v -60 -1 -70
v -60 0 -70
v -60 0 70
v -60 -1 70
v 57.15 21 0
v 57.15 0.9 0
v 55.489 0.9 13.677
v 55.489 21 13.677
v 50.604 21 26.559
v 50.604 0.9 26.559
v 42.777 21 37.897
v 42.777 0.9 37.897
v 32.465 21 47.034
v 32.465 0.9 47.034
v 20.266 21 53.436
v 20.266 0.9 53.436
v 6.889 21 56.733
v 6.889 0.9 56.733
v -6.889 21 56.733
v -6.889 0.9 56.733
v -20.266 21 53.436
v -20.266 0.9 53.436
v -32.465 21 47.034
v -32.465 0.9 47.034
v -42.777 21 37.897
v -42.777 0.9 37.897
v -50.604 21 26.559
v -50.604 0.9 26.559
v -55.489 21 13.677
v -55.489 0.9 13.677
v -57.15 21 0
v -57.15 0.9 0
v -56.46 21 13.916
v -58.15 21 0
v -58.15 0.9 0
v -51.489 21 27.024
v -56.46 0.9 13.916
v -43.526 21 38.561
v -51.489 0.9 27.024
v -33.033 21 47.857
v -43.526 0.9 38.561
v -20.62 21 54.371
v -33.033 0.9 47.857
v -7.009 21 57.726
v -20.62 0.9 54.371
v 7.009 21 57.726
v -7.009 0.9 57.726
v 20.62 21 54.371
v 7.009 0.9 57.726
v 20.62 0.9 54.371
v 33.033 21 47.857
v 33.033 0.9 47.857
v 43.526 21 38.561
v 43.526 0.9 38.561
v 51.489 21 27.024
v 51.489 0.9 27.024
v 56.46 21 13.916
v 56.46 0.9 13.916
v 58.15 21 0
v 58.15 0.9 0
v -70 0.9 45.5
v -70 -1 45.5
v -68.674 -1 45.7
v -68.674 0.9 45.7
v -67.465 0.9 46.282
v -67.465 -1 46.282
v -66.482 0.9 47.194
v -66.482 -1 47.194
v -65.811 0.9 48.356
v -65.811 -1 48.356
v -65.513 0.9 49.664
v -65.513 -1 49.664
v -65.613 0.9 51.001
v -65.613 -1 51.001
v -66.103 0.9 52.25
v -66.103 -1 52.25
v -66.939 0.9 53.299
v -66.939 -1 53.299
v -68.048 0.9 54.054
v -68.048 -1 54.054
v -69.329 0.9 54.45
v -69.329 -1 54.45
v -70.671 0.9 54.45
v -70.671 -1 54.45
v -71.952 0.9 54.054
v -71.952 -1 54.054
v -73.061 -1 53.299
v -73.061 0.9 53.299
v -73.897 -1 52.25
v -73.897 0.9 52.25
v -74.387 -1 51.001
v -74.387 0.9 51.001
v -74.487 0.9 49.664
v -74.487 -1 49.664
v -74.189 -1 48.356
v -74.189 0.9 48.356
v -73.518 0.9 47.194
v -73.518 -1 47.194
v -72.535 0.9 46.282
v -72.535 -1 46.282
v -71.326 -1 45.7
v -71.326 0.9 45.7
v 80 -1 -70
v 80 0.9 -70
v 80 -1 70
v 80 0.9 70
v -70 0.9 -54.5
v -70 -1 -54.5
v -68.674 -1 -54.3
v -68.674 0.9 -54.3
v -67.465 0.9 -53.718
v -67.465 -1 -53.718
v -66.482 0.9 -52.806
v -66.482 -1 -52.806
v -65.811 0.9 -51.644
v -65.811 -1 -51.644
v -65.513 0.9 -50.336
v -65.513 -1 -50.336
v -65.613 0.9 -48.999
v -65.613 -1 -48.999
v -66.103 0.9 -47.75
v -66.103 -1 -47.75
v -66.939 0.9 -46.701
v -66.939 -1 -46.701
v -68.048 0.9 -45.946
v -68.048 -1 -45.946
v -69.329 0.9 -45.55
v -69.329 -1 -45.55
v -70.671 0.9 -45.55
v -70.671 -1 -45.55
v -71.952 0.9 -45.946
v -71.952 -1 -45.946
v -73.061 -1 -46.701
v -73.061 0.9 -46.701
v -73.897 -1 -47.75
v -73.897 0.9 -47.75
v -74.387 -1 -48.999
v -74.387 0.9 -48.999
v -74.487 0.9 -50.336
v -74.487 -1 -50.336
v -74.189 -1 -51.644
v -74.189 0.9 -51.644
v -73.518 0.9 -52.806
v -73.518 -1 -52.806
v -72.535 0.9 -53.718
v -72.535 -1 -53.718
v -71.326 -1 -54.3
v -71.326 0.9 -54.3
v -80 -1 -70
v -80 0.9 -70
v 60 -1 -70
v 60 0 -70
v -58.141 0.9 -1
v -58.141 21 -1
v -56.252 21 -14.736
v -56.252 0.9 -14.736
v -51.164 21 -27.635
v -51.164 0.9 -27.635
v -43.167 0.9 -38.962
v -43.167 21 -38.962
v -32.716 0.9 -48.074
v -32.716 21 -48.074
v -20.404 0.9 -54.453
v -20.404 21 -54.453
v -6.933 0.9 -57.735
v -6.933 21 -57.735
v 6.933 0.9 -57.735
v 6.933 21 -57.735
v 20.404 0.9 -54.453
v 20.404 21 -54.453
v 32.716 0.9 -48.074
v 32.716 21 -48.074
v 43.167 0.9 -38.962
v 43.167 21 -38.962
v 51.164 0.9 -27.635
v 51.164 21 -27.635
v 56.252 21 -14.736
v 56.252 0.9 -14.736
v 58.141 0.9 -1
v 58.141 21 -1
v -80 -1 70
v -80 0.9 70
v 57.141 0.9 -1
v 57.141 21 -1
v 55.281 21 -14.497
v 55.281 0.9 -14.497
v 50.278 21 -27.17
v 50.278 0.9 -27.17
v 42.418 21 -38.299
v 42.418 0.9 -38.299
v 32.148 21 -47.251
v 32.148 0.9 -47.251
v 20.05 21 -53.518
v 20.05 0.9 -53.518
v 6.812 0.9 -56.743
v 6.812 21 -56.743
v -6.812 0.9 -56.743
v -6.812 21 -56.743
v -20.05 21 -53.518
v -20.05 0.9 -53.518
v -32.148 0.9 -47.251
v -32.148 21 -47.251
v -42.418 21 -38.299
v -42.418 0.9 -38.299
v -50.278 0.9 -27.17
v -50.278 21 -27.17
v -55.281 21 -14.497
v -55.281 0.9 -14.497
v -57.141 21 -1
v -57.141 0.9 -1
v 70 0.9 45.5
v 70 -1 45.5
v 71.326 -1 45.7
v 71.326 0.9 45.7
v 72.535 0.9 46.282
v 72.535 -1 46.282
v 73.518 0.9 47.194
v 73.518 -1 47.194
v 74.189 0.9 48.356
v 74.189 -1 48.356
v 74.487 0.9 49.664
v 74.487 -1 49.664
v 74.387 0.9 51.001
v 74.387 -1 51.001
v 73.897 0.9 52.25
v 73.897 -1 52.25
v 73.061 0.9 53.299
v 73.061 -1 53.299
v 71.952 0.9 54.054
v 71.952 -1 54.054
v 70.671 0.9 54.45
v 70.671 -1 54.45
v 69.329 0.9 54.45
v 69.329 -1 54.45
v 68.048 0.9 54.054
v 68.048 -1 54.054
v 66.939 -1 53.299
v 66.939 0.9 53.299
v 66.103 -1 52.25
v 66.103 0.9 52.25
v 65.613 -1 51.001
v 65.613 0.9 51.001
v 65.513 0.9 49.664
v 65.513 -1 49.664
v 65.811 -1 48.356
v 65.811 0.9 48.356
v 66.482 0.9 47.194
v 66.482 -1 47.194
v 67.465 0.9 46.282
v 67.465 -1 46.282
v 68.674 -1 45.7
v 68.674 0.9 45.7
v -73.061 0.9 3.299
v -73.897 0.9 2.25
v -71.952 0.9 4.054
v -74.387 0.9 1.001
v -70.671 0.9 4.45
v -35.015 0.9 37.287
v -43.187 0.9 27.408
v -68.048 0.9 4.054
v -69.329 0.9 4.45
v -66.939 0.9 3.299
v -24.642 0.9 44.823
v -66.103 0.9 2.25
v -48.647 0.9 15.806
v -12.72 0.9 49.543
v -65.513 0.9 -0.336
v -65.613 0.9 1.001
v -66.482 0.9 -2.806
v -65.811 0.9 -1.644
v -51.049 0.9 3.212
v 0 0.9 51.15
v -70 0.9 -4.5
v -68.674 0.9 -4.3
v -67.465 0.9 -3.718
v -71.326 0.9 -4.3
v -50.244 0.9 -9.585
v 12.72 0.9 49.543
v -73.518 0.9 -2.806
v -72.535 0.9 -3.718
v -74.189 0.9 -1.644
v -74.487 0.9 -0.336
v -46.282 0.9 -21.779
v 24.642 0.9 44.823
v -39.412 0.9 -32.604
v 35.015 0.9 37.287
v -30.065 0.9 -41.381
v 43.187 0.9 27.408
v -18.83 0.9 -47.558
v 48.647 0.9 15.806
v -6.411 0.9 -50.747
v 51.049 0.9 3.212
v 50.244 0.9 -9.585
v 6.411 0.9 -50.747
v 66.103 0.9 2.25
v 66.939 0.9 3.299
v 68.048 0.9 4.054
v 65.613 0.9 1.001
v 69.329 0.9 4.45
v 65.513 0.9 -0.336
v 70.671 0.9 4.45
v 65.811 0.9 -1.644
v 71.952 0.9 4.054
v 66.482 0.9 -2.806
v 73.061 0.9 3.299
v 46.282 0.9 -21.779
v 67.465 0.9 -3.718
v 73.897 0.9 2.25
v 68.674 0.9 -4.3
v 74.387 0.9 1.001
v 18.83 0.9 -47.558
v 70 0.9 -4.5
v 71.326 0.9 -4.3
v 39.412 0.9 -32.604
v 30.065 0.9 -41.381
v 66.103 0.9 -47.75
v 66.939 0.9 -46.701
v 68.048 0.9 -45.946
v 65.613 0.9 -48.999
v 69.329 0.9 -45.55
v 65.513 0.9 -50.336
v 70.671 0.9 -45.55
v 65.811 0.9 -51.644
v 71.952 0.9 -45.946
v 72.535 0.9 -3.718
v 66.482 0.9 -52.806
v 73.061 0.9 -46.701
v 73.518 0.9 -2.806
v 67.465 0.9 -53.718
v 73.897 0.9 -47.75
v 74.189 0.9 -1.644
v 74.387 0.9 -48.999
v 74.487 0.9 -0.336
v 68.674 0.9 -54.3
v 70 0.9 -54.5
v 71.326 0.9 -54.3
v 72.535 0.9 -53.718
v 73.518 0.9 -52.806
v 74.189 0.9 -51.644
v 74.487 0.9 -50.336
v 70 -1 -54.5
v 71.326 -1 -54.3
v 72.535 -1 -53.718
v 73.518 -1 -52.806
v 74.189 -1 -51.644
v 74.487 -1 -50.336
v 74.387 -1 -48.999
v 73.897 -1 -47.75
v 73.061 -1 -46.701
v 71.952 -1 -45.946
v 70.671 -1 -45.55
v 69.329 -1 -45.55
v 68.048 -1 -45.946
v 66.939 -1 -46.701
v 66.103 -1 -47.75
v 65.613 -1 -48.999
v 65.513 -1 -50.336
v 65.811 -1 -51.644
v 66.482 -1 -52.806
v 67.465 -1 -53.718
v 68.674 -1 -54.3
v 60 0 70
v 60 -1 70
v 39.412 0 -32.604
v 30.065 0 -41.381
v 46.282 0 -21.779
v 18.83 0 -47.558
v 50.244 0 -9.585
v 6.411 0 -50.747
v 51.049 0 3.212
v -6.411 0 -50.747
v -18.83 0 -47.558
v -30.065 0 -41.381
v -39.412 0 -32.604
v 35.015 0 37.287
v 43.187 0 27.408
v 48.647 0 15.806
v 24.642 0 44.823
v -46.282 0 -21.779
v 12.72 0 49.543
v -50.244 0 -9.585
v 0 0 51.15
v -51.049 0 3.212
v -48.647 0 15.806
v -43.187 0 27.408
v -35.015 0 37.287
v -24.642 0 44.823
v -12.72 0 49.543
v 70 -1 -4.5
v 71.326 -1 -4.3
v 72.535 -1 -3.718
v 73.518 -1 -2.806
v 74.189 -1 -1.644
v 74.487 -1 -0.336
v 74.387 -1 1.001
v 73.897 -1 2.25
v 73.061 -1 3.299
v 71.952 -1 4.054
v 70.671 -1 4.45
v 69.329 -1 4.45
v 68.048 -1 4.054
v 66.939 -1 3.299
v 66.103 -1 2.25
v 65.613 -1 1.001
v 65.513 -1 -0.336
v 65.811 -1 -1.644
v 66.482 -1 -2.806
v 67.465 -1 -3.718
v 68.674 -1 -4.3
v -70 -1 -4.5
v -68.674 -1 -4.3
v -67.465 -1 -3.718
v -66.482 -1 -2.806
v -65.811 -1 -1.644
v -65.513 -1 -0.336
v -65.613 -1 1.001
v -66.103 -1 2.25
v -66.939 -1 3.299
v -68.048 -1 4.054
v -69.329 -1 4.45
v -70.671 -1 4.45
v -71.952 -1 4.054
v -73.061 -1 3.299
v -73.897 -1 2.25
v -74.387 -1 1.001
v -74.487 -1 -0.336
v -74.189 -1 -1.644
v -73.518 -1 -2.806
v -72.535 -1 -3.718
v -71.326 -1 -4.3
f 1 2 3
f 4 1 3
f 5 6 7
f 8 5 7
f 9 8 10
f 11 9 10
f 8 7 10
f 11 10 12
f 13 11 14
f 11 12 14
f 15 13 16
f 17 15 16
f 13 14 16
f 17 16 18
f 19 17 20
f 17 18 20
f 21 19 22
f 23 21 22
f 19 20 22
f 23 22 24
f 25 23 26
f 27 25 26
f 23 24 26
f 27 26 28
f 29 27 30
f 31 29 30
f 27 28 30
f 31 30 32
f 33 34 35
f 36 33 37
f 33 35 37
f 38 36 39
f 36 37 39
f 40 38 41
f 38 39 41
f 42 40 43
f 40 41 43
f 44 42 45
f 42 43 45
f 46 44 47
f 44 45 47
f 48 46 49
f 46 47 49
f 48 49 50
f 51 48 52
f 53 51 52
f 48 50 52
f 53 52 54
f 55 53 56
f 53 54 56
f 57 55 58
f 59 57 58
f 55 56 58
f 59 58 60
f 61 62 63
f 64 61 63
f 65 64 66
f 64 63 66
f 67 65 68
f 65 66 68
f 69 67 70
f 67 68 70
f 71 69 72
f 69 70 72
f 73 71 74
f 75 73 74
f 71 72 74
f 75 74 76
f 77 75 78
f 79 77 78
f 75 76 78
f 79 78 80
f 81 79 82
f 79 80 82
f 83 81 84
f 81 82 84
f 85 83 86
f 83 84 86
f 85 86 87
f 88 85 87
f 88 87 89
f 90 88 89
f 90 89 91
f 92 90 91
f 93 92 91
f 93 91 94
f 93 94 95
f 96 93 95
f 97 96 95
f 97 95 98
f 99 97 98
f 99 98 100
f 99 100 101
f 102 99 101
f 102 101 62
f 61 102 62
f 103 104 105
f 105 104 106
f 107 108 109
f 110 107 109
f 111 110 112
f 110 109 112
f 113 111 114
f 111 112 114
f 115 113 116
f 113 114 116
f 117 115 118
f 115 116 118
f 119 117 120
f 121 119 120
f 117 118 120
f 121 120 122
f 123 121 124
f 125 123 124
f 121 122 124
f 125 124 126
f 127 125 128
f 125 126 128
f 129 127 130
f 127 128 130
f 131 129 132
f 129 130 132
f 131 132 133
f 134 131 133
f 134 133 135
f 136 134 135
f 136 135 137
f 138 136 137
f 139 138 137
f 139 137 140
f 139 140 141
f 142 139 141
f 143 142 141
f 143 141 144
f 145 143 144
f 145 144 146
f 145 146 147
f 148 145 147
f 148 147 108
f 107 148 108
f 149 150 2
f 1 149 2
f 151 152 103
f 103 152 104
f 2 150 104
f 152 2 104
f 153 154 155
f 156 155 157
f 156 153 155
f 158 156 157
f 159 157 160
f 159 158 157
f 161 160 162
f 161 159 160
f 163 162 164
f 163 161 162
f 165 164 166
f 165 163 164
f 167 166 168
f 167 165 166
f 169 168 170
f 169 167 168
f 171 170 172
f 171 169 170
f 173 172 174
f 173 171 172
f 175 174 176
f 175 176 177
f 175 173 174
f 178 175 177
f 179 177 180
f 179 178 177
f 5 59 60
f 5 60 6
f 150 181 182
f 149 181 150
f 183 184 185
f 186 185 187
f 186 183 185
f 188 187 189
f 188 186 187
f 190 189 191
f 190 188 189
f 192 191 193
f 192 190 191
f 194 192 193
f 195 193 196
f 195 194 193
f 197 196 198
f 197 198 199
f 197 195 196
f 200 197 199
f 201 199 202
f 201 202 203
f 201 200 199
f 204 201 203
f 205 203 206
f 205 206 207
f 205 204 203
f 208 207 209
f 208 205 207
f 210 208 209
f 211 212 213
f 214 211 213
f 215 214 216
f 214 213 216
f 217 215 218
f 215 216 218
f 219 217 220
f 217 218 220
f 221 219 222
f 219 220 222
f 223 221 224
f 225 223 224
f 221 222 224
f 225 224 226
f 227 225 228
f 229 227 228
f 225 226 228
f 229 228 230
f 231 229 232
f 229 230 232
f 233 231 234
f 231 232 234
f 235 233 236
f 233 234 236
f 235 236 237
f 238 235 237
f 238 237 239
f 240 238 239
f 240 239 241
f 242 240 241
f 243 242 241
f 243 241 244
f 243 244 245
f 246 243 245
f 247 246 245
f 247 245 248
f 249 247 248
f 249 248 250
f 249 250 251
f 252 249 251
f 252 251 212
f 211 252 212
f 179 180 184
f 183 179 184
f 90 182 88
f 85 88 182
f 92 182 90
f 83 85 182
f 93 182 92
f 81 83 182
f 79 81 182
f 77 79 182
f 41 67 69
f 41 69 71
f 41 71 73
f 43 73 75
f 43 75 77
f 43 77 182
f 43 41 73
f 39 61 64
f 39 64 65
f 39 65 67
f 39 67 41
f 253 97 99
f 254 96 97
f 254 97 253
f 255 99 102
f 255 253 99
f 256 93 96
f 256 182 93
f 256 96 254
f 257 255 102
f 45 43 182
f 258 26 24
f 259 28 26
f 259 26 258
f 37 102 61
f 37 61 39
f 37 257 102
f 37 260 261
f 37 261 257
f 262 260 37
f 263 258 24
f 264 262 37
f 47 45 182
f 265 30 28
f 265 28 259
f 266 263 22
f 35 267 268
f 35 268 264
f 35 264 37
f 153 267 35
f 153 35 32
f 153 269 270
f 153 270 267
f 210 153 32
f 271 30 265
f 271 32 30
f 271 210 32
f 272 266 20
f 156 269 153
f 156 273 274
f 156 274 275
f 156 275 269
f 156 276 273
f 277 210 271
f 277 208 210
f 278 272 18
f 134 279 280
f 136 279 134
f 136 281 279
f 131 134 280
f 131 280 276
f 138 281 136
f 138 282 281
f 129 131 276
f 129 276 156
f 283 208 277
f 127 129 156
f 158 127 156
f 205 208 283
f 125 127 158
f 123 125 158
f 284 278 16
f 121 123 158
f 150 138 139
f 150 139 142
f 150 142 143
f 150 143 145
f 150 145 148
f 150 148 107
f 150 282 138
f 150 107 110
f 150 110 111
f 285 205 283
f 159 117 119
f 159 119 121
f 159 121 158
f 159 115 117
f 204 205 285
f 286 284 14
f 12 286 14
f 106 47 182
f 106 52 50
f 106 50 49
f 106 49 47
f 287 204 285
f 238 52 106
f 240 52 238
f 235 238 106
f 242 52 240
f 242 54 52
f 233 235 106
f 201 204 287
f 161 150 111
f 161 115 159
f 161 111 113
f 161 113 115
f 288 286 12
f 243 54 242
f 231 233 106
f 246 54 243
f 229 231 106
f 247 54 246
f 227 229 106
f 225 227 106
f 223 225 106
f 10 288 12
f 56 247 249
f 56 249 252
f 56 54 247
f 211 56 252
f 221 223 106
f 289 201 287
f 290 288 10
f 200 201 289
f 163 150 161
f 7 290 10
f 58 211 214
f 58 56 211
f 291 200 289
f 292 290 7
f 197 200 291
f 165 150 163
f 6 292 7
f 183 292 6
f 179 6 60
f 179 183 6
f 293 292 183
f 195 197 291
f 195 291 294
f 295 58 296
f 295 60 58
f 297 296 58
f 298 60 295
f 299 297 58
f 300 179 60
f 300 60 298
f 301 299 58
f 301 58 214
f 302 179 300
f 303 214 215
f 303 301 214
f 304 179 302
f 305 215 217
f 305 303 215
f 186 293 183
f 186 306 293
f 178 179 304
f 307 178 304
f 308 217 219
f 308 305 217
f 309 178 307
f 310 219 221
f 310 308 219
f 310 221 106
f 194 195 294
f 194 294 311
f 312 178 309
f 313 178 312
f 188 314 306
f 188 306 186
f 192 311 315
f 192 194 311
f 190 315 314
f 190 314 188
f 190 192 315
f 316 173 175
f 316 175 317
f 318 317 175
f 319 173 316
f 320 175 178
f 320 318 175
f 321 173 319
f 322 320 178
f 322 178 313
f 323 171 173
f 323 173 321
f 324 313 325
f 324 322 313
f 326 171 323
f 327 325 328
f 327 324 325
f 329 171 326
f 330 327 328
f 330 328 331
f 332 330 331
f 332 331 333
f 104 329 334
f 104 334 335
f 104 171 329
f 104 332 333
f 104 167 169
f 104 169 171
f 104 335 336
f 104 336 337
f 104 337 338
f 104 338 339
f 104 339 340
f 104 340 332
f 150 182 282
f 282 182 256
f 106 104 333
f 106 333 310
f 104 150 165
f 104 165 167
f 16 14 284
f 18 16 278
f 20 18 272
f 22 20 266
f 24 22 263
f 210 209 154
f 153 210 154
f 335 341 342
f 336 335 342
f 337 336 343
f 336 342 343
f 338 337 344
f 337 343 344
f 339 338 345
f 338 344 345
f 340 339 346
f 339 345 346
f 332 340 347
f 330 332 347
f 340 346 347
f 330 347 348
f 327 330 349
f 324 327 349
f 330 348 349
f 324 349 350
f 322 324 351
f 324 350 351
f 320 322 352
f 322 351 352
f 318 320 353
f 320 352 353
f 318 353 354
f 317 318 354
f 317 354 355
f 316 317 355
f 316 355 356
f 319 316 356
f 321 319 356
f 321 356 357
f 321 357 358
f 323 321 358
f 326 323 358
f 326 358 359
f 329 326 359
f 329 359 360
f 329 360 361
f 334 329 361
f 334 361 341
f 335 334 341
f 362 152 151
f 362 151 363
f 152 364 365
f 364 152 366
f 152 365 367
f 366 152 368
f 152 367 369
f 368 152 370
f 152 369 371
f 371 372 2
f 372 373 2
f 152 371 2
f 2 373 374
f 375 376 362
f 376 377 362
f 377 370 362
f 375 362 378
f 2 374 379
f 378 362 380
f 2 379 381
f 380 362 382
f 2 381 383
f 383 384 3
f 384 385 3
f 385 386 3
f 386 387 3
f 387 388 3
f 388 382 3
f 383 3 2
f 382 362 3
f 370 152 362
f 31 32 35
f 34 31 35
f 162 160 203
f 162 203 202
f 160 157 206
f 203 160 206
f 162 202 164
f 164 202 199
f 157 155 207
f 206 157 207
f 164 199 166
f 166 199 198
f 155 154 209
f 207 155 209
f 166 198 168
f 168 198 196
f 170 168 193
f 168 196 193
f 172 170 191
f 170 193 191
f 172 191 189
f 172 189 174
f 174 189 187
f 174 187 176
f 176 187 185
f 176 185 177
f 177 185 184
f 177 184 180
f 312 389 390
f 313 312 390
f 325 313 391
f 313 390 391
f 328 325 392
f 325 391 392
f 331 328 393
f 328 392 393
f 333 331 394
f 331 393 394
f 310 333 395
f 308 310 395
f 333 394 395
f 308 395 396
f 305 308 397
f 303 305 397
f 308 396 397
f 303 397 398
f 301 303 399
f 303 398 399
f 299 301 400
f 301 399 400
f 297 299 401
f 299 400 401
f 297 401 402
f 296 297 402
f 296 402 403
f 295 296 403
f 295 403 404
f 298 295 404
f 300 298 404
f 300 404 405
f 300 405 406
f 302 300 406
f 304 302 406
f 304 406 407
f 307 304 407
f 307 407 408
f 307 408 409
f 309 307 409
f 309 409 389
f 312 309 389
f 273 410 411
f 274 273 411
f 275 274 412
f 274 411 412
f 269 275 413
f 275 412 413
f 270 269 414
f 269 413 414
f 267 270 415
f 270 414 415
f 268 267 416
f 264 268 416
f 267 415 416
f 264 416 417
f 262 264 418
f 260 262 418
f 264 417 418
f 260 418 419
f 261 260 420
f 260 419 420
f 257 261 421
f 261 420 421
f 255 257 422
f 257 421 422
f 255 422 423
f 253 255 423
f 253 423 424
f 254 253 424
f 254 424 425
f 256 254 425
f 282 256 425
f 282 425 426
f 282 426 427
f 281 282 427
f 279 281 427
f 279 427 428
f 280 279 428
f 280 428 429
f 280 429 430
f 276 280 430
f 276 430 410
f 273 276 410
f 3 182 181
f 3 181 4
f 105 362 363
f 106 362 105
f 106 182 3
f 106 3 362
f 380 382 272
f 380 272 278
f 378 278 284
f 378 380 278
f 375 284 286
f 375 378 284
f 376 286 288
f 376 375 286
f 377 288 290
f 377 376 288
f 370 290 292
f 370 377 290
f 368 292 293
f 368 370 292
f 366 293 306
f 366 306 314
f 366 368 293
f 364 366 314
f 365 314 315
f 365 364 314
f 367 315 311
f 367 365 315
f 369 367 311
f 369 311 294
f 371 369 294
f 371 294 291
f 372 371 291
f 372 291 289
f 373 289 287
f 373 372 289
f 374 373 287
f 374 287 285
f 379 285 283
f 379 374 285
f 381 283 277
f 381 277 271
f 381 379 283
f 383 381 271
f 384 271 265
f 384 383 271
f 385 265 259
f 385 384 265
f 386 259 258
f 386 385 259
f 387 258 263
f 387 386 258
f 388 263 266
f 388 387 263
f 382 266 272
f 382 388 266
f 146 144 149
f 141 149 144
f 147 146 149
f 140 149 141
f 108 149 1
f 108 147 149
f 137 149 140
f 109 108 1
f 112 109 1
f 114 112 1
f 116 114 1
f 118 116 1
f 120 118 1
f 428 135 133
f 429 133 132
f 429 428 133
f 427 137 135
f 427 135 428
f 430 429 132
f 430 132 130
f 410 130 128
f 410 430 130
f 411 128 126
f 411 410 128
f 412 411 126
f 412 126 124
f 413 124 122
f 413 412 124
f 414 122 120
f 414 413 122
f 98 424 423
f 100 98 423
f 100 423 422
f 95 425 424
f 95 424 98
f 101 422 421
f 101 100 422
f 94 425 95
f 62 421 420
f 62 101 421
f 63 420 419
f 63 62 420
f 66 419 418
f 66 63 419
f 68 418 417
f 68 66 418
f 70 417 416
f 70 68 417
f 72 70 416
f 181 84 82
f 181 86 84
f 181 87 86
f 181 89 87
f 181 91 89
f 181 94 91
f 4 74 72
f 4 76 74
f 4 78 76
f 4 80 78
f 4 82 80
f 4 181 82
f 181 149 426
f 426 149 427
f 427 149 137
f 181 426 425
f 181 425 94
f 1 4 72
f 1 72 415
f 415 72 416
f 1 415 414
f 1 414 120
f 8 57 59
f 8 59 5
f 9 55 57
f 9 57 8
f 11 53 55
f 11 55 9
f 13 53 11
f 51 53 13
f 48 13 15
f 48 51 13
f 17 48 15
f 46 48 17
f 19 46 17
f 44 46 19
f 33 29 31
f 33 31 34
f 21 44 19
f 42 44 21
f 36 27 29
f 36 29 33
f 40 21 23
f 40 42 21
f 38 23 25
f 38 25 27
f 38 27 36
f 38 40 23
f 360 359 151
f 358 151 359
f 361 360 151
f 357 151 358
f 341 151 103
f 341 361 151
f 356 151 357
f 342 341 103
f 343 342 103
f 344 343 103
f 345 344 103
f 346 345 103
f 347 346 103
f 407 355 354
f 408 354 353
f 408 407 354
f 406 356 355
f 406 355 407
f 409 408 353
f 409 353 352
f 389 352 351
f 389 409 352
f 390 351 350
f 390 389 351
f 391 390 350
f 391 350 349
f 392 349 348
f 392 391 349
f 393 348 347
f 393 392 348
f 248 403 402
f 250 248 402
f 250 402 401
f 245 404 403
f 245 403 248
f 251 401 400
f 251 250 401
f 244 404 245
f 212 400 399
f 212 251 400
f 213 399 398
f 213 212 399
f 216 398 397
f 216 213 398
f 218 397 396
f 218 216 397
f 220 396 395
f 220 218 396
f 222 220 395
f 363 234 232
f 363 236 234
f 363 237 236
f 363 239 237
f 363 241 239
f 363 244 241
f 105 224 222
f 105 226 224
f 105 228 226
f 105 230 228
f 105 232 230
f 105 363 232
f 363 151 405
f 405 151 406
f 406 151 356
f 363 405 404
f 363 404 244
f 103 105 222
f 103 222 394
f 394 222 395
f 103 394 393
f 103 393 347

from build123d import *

# Parameters (mm, degrees)
CROQUIS1_W                       = 160
CROQUIS1_H                       = 140
CROQUIS1_R                       = 51.15
SALIENTE_EXTRUIR1_DEPTH          = 0.9
CROQUIS4_W                       = 20
CROQUIS4_H                       = 140
SALIENTE_EXTRUIR3_DEPTH          = 1
TALADRO_DE_MARGEN_PARA_M81_D     = 9
TALADRO_DE_MARGEN_PARA_M81_DEPTH = 10
TALADRO_DE_MARGEN_PARA_M81_TIP   = 2.703872786
SALIENTE_EXTRUIR4_DEPTH          = 21


with BuildPart() as part:
    # Croquis1 → Saliente-Extruir1 (new body)
    with BuildSketch(Plane(origin=(0, 0, 0), x_dir=(1, 0, 0), z_dir=(0, 1, 0))):
        Rectangle(CROQUIS1_W, CROQUIS1_H)
        with Locations(Location((0, 0, 0), (0, 0, 270))):
            Circle(CROQUIS1_R, mode=Mode.SUBTRACT)
    extrude(amount=SALIENTE_EXTRUIR1_DEPTH)

    # Croquis4 → Saliente-Extruir3 (add)
    with BuildSketch(Plane.XZ):
        with Locations((70, 0)):
            Rectangle(CROQUIS4_W, CROQUIS4_H)
        with Locations((-70, 0)):
            Rectangle(CROQUIS4_W, CROQUIS4_H)
    extrude(amount=SALIENTE_EXTRUIR3_DEPTH)

    # Taladro de margen para M81
    with Locations(Plane(origin=(-70, 0.9, -50), x_dir=(0, 0, 1), z_dir=(0, 1, 0))):
        with Locations((0, 0), (50, 0), (100, 0), (100, 140), (50, 140), (0, 140)):
            Hole(TALADRO_DE_MARGEN_PARA_M81_D / 2, depth=TALADRO_DE_MARGEN_PARA_M81_DEPTH)
            with Locations((0, 0, -(TALADRO_DE_MARGEN_PARA_M81_DEPTH + TALADRO_DE_MARGEN_PARA_M81_TIP / 2))):  # 118° drill point
                Cone(0, TALADRO_DE_MARGEN_PARA_M81_D / 2, TALADRO_DE_MARGEN_PARA_M81_TIP, mode=Mode.SUBTRACT)

    # Croquis5 → Saliente-Extruir4 (add)
    with BuildSketch(Plane.XZ):
        with BuildLine():
            ThreePointArc((57.15, 0), (0, 57.15), (-57.15, 0))
            Line((-57.15, 0), (-58.15, 0))
            ThreePointArc((-58.15, 0), (0, 58.15), (58.15, 0))
            Line((58.15, 0), (57.15, 0))
        make_face()
        with BuildLine():
            ThreePointArc((-58.141400912, -1), (0, -58.15), (58.141400912, -1))
            Line((58.141400912, -1), (57.141250424, -1))
            ThreePointArc((57.141250424, -1), (0, -57.15), (-57.141250424, -1))
            Line((-57.141250424, -1), (-58.141400912, -1))
        make_face()
    extrude(amount=-SALIENTE_EXTRUIR4_DEPTH)


solid = part.part
